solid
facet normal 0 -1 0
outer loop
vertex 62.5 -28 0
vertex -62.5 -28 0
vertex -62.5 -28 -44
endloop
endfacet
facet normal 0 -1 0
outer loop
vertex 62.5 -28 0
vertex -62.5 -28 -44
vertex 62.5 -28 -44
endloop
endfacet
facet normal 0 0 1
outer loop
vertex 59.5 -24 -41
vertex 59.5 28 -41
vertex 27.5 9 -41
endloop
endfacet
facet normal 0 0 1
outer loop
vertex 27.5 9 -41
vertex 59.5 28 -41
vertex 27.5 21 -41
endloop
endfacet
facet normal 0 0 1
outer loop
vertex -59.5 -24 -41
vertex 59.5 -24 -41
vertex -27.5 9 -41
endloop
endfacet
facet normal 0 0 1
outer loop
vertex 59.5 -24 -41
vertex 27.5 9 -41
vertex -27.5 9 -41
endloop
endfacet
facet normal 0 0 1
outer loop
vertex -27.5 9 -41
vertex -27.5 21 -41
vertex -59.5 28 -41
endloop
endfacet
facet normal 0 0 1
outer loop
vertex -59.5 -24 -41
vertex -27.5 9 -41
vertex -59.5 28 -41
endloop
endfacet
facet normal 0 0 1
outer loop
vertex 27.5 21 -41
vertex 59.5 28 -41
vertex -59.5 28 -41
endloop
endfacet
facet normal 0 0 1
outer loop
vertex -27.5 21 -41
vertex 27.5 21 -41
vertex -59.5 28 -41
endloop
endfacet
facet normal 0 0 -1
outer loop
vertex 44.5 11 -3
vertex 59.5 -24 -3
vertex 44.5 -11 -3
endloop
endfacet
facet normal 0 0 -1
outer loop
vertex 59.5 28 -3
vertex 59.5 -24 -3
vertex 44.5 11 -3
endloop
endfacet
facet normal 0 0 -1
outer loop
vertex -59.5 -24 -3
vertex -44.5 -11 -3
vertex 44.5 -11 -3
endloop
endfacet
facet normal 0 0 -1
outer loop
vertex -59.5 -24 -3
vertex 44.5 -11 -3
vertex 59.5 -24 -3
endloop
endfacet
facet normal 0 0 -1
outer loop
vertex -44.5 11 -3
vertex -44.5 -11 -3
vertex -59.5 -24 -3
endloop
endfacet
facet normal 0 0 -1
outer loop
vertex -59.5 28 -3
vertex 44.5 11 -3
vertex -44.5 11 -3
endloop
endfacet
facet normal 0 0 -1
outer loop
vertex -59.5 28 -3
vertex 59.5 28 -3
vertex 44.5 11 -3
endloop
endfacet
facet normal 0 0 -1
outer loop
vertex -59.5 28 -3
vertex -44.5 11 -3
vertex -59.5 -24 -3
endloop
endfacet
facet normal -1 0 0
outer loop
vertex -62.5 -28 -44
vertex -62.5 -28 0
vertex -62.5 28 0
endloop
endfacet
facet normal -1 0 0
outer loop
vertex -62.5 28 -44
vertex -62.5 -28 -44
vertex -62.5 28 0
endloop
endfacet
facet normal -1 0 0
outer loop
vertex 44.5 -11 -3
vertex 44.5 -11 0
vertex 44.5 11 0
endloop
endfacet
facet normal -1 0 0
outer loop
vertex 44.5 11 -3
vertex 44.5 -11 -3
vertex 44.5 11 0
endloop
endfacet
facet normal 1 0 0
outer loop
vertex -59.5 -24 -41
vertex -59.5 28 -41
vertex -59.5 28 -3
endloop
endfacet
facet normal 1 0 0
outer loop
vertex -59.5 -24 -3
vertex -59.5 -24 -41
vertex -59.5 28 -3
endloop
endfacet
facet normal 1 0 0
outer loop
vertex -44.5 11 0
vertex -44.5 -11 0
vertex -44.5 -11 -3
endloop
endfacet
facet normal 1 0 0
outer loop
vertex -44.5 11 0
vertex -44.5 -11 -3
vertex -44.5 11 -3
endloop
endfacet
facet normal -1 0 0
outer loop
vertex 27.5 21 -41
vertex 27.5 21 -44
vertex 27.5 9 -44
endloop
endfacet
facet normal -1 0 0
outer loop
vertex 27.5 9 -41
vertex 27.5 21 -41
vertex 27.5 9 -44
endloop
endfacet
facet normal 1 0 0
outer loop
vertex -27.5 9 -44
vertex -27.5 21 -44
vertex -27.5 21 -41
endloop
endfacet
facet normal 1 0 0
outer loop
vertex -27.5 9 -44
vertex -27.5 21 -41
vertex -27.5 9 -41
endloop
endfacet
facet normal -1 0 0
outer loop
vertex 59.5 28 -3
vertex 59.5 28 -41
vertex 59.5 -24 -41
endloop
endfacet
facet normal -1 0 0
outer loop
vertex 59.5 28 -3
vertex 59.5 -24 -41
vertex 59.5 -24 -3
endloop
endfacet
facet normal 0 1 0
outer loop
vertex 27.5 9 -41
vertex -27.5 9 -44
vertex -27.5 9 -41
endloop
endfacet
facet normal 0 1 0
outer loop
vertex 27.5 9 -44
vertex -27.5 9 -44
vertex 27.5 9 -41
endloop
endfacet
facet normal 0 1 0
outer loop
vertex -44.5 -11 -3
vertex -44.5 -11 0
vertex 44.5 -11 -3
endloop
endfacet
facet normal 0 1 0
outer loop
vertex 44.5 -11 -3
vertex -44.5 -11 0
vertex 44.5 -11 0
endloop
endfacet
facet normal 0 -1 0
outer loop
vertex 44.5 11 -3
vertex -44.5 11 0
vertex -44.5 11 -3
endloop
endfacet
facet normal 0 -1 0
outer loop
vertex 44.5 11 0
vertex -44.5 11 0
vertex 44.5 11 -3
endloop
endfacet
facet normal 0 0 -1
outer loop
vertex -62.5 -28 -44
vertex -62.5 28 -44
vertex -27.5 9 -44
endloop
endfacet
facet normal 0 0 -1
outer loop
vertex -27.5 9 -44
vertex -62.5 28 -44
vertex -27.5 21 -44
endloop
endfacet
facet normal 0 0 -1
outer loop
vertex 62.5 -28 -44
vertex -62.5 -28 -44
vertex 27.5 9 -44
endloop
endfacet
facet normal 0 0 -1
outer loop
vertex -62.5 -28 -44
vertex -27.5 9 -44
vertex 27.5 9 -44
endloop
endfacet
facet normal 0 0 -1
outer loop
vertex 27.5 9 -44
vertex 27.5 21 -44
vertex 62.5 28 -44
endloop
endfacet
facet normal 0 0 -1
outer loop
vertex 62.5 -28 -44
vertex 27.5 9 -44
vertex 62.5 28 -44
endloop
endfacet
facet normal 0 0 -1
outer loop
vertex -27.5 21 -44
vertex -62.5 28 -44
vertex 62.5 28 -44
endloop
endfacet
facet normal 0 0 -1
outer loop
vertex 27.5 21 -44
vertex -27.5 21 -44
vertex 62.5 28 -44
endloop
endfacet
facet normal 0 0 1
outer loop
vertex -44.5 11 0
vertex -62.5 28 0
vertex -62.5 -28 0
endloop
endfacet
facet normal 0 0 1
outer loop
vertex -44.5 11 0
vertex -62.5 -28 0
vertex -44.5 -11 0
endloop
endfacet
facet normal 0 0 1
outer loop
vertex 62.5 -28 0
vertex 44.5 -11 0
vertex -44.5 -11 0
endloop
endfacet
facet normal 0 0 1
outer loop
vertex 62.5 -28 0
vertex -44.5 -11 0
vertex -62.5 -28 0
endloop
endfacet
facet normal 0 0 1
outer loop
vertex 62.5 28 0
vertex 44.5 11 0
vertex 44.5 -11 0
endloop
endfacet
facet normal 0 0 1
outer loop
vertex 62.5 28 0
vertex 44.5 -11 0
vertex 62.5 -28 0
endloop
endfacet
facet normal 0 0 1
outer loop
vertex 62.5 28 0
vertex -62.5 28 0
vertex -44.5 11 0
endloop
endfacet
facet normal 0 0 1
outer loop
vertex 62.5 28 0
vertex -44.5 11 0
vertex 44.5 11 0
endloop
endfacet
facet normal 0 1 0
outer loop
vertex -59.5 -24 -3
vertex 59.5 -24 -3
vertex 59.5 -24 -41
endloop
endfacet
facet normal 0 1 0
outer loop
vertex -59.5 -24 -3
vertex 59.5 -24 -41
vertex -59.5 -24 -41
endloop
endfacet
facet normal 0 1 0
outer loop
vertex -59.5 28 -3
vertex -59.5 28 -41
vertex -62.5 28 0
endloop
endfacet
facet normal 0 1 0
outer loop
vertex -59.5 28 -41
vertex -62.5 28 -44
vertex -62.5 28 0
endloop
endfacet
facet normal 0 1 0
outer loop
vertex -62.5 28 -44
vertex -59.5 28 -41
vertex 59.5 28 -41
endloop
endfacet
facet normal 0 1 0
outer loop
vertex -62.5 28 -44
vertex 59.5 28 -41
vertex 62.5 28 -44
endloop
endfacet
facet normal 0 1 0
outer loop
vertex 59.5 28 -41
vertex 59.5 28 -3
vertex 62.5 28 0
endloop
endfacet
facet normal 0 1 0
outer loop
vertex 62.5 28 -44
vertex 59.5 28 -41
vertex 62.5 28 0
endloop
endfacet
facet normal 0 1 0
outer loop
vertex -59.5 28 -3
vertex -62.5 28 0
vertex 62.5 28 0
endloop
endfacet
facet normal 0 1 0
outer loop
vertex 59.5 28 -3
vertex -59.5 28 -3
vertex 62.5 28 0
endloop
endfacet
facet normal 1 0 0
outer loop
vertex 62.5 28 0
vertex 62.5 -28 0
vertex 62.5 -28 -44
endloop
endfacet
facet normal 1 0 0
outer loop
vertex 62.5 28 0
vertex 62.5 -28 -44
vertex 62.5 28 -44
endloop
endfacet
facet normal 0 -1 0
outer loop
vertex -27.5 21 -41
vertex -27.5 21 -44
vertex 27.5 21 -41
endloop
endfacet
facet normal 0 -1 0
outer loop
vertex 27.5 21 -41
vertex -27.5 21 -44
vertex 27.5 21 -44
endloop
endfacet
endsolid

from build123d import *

# Parameters (mm, degrees)
F0_W     = 125
F0_H     = 56
F1_DEPTH = 44
F3_W     = 55
F3_H     = 12
F4_DEPTH = 13
F2_W     = 89
F2_H     = 22
F5_DEPTH = 17
F6_W     = 119
F6_H     = 38
F7_DEPTH = 52


with BuildPart() as f1:
    # F0 (on Top) → F1 (new body)
    with BuildSketch(Plane.XY):
        Rectangle(F0_W, F0_H)
    extrude(amount=-F1_DEPTH)

    # F3 (on face) → F4 (cut)
    with BuildSketch(Plane(origin=(0, 0, -44), x_dir=(1, 0, 0), z_dir=(0, 0, -1))):
        with Locations((0, -15)):
            Rectangle(F3_W, F3_H)
    extrude(amount=-F4_DEPTH, mode=Mode.SUBTRACT)

    # F2 (on face) → F5 (cut)
    with BuildSketch(Plane.XY):
        Rectangle(F2_W, F2_H)
    extrude(amount=-F5_DEPTH, mode=Mode.SUBTRACT)

    # F6 (on face) → F7 (cut)
    with BuildSketch(Plane(origin=(0, 28, 0), x_dir=(-1, 0, 0), z_dir=(0, 1, 0))):
        with Locations((0, -22)):
            Rectangle(F6_W, F6_H)
    extrude(amount=-F7_DEPTH, mode=Mode.SUBTRACT)


solid = f1.part
